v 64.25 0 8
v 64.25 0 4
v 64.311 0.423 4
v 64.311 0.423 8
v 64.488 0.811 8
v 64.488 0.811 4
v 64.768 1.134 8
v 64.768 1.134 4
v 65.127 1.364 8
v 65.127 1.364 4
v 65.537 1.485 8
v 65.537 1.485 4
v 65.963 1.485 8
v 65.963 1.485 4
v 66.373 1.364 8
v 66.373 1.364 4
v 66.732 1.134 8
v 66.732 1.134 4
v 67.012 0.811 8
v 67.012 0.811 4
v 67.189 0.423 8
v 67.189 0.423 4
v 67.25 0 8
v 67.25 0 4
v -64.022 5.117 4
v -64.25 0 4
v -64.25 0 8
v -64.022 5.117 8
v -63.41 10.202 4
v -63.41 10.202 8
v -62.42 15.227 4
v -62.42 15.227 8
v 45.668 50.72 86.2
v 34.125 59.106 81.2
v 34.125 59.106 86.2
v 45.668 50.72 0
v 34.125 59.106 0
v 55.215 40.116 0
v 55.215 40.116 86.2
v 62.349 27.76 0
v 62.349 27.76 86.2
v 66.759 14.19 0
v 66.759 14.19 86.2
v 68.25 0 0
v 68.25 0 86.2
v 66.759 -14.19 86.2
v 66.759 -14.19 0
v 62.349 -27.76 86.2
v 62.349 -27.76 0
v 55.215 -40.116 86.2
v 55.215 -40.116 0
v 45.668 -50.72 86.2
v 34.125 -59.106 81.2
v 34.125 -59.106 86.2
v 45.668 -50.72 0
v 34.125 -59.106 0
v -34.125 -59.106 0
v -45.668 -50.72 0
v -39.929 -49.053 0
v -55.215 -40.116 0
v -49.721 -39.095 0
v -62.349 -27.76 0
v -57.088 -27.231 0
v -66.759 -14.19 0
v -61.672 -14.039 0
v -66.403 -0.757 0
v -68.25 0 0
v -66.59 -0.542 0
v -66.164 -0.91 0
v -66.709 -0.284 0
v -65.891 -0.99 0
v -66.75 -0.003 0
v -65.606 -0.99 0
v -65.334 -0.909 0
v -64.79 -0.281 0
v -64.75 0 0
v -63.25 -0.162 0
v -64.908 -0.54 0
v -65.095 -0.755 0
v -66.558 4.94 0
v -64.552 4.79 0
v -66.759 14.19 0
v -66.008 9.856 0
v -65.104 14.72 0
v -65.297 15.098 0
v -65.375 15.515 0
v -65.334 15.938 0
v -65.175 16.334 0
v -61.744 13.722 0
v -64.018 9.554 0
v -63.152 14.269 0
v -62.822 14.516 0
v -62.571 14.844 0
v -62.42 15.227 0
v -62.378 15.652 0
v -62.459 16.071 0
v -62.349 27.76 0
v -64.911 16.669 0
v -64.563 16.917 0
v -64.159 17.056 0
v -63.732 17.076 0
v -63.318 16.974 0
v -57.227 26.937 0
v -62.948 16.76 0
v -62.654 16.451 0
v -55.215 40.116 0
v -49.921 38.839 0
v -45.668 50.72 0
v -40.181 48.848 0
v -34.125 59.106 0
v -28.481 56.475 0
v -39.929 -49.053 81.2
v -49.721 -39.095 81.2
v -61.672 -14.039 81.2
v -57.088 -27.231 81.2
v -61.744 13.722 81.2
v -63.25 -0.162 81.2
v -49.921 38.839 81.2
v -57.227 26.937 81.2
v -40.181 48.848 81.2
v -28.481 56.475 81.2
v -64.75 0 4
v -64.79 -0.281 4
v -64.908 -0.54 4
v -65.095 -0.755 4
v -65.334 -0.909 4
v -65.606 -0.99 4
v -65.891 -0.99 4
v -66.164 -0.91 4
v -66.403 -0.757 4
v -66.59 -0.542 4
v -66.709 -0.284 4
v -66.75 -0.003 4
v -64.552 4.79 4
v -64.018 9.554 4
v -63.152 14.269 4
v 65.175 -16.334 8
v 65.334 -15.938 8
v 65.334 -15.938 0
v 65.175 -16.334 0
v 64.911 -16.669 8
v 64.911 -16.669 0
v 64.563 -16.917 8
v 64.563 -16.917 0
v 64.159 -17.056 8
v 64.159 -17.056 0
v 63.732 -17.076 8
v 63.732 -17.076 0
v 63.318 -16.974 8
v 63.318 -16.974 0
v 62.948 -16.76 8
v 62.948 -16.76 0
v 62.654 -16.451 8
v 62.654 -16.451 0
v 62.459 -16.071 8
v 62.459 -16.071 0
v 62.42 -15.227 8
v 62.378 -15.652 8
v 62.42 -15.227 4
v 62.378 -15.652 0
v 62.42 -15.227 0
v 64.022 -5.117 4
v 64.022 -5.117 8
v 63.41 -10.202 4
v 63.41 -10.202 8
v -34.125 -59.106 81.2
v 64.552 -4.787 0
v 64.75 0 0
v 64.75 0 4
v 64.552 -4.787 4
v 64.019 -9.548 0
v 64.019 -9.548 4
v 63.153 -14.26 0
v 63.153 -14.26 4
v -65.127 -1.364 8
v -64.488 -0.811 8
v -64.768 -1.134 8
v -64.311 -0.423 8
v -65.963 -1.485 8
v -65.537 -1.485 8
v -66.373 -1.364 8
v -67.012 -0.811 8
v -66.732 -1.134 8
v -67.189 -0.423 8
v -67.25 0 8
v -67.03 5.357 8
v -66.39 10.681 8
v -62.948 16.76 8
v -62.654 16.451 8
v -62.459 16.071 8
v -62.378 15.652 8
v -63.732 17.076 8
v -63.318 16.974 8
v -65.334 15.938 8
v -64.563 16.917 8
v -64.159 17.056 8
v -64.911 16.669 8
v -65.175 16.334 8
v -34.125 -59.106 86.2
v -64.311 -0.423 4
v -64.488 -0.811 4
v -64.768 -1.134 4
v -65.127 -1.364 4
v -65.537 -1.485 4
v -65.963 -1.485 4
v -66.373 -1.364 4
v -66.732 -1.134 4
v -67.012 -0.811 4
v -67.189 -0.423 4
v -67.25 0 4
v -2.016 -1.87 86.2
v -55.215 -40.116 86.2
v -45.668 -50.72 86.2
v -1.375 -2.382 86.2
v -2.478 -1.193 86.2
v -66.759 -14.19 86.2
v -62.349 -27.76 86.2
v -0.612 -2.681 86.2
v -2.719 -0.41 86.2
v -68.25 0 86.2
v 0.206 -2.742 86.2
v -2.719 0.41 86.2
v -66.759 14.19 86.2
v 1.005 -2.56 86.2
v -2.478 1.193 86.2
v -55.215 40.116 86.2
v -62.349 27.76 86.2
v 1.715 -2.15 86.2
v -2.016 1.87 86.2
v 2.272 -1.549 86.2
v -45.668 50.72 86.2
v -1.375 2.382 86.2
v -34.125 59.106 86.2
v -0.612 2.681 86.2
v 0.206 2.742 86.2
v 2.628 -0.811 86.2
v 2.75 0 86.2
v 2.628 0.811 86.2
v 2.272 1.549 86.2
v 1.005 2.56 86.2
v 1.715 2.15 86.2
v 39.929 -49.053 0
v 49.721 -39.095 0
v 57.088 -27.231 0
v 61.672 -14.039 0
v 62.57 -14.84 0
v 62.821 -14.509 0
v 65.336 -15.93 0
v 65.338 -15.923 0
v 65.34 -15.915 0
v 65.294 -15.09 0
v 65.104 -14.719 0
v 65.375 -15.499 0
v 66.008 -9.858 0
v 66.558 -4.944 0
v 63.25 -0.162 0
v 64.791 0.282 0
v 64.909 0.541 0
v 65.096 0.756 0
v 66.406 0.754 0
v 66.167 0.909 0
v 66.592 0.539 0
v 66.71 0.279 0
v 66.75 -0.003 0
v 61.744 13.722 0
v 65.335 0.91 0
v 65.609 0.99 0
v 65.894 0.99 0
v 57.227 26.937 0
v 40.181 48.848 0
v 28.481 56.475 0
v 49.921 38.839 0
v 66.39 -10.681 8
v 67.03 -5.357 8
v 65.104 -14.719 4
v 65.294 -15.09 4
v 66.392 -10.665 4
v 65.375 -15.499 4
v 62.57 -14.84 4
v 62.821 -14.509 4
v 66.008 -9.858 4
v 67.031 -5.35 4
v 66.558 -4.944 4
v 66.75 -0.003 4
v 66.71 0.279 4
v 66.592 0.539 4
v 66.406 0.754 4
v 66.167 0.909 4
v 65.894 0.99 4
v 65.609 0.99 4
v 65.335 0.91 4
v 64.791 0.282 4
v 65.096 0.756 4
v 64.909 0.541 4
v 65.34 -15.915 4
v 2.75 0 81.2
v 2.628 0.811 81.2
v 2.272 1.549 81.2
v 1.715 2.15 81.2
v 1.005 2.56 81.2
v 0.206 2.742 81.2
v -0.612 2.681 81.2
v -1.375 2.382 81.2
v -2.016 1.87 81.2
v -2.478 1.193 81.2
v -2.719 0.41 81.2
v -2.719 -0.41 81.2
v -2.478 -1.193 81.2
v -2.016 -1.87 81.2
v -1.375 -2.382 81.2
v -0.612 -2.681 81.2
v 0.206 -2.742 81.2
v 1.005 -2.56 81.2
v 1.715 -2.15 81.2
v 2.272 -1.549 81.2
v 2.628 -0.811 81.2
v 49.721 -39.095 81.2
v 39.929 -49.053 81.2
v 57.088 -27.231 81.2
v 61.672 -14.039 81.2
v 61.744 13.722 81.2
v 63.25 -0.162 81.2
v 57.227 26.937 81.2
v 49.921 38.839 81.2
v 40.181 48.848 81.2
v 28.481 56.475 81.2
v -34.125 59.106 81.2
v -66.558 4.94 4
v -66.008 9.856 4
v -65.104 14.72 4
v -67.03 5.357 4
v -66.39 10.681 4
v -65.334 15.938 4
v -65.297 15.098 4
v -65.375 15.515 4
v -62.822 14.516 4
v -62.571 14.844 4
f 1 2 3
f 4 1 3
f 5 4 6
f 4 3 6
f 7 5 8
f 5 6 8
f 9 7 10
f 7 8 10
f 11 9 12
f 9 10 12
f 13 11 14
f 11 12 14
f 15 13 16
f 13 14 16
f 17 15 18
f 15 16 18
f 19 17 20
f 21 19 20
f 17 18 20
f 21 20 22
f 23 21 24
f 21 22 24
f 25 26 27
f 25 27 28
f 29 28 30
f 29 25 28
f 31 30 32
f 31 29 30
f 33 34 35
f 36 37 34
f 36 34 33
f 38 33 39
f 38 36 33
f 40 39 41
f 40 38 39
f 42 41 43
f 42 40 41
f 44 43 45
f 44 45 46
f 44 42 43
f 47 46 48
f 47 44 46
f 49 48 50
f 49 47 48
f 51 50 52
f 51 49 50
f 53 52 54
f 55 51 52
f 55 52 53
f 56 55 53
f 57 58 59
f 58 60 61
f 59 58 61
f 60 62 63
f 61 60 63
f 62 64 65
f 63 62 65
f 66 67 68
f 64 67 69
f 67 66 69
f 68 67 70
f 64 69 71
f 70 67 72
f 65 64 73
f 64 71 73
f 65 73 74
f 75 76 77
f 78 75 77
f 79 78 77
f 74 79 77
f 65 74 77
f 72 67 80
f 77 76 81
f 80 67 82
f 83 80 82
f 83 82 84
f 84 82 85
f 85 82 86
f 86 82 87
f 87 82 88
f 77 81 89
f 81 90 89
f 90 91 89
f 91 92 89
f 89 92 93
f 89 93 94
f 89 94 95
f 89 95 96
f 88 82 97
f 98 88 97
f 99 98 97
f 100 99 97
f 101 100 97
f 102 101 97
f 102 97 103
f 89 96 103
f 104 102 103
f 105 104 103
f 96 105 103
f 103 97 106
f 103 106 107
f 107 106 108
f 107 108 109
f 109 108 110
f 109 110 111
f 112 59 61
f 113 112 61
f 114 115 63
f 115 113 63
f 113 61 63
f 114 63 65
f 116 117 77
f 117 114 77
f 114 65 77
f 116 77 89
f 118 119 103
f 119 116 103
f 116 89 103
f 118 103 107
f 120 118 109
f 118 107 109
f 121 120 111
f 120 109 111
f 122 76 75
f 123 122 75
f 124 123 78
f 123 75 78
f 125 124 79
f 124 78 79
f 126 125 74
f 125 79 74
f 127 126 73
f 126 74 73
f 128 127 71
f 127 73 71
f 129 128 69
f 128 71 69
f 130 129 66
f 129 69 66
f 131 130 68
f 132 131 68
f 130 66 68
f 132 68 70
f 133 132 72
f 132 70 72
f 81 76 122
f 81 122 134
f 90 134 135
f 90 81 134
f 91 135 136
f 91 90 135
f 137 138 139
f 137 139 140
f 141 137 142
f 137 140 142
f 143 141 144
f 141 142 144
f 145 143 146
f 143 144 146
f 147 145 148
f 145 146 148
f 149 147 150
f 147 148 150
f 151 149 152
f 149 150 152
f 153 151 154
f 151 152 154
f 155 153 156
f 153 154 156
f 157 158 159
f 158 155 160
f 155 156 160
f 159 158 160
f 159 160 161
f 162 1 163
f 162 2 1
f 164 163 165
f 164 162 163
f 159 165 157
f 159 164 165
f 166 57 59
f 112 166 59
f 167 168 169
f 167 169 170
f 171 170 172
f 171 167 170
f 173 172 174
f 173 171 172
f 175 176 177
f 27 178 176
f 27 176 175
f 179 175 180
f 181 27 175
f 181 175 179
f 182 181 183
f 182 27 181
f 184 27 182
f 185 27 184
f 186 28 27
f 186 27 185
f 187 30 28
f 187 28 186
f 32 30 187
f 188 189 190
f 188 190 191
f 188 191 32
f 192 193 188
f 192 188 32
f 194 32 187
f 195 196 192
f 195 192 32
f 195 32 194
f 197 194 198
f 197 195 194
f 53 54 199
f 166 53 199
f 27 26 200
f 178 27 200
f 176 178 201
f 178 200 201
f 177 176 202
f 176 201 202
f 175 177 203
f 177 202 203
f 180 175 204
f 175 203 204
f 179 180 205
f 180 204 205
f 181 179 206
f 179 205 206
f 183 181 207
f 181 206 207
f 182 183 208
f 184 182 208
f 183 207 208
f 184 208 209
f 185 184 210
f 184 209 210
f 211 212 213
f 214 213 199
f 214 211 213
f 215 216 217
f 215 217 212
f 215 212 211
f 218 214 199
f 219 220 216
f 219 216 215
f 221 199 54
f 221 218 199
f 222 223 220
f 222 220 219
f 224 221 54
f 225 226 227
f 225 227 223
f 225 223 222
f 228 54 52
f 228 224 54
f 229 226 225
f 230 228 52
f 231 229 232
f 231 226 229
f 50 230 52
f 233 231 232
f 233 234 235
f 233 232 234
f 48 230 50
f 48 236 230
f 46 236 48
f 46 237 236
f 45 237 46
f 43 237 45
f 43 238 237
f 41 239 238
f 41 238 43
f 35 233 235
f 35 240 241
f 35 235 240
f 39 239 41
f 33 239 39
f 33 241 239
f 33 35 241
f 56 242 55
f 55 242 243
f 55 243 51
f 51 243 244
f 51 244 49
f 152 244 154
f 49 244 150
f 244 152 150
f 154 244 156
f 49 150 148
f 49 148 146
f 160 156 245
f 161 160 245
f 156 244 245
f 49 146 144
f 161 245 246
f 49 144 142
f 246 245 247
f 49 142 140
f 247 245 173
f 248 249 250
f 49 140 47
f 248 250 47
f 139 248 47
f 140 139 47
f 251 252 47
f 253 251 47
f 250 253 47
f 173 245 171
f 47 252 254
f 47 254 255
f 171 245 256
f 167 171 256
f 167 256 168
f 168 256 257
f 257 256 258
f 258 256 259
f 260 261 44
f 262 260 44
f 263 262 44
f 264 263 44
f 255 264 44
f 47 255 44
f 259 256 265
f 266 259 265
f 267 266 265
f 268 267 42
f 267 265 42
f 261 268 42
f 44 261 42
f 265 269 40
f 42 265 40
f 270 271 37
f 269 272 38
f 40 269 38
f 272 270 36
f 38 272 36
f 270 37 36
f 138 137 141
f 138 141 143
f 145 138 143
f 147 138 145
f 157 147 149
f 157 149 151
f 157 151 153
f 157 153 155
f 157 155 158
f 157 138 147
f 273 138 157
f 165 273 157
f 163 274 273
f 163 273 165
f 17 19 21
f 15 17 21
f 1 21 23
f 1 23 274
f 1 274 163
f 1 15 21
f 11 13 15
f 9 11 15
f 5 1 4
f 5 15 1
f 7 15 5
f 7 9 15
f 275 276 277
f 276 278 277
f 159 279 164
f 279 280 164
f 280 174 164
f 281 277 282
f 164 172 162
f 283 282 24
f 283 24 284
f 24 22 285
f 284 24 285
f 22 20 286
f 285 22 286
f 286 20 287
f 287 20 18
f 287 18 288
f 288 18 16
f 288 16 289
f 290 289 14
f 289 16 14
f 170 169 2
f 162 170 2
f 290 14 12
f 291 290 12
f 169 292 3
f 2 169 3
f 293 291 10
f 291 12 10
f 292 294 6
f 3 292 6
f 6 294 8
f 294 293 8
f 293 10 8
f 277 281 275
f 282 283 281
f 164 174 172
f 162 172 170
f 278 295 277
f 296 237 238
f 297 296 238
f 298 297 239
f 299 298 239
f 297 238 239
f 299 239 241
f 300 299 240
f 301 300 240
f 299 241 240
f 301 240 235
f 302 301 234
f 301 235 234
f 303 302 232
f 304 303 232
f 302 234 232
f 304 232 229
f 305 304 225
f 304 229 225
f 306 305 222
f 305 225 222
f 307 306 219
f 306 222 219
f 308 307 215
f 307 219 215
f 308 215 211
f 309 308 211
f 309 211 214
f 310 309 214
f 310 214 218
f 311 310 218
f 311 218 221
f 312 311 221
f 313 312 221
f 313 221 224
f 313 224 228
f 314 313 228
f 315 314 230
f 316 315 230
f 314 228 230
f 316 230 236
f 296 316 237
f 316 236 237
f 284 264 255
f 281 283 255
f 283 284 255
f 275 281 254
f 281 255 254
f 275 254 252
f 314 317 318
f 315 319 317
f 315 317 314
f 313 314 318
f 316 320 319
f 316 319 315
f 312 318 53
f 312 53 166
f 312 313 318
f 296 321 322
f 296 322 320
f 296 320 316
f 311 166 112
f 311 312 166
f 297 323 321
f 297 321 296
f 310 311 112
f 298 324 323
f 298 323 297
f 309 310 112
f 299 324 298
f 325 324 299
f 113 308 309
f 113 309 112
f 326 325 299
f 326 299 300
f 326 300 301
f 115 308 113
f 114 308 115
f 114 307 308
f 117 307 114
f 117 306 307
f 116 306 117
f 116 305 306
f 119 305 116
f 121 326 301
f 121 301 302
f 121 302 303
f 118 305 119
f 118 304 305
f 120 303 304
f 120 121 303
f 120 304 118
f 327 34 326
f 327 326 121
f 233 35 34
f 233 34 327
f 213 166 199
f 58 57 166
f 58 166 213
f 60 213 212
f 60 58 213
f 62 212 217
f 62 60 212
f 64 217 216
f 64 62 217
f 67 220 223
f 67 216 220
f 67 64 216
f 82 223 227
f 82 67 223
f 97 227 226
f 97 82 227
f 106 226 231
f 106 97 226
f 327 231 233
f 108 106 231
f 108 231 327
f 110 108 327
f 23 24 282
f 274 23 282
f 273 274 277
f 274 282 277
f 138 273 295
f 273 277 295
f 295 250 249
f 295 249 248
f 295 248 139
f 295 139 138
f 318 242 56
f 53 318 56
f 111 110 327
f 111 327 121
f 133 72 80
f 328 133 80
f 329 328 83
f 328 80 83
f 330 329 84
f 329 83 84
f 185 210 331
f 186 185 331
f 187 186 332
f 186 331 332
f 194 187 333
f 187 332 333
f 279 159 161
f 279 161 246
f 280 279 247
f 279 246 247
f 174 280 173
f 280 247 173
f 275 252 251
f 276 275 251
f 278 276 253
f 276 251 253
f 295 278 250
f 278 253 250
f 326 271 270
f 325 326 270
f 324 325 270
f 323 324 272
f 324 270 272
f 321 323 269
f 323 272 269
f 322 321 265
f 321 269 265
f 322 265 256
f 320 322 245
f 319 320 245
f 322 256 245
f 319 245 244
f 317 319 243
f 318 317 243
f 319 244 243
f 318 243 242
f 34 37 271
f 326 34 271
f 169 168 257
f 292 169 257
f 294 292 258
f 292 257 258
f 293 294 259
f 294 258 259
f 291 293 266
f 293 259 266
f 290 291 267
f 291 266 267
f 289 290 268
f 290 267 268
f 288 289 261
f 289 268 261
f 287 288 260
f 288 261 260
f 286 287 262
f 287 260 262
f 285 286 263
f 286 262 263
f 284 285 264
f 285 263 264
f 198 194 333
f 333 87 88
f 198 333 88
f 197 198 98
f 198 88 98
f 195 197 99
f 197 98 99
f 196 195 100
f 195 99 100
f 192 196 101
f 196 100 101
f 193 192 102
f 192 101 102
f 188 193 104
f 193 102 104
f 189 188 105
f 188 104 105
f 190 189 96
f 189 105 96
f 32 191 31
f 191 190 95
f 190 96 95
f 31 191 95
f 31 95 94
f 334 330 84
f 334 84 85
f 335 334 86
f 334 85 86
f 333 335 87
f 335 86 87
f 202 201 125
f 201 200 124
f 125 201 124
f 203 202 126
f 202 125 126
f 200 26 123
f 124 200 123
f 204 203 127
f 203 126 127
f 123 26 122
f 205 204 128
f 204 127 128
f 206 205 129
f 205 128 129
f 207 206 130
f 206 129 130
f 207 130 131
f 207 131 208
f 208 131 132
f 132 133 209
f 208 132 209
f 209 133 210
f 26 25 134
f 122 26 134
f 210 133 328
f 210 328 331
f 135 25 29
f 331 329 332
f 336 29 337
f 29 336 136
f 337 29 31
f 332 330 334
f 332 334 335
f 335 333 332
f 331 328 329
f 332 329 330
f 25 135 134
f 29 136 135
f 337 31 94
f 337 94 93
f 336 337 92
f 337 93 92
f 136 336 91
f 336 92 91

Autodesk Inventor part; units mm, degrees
ref_plane "YZ Plane" through (0, 0, 0) normal (1, 0, 0) x (0, 1, 0)
ref_plane "XZ Plane" through (0, 0, 0) normal (0, 1, 0) x (-1, 0, 0)
ref_plane "XY Plane" through (0, 0, 0) normal (0, 0, 1) x (1, 0, 0)
sketch "Sketch1" plane through (0, 0, 0) normal (0, 0, 1) x (1, 0, 0)
  circle A0 centre (0, 0) radius 63.25
  circle A1 centre (0, 0) radius 68.25
  dimension "d0" = 126.5
  dimension "d1" = 5
extrude "Extrusion1" add sketch "Sketch1" along normal blind 81.2
sketch "Sketch2" plane through (0, 0, 81.2) normal (0, 0, 1) x (1, 0, 0)
  circle A0 centre (0, 0) radius 68.25
extrude "Extrusion2" add sketch "Sketch2" along normal blind 5
sketch "Sketch3" plane through (0, 0, 86.2) normal (0, 0, 1) x (1, 0, 0)
  circle A0 centre (0, 0) radius 2.75
  dimension "d6" = 5.5
extrude "Extrusion3" cut sketch "Sketch3" against normal blind 5
sketch "Sketch4" plane through (0, 0, 86.2) normal (0, 0, 1) x (1, 0, 0)
  line L0 (0, 0) -> (-34.125, 59.1062)
  circle A0 centre (0, 0) radius 68.25 projected
  line L1 (0, 0) -> (68.25, 0) construction
  circle A1 centre (0, 0) radius 2.75 projected
  line L2 (0, 0) -> (34.125, 59.1062)
  line L3 (34.125, 59.1062) -> (-34.125, 59.1062)
  line L4 (0, 0) -> (-34.125, -59.1062)
  circle A2 centre (0, 0) radius 68.25 projected
  line L5 (0, 0) -> (68.25, 0) construction
  line L6 (0, 0) -> (34.125, -59.1062)
  line L7 (0, 0) -> (68.25, 0) construction
  line L8 (34.125, -59.1062) -> (-34.125, -59.1062)
  dimension "d9" = 120
  dimension "d15" = 120
  dimension "d16" = 60
extrude "Extrusion4" cut sketch "Sketch4" against normal through all contours A0 L3 | L8 A0
sketch "Sketch5" plane through (0, 0, 0) normal (0, 0, -1) x (-1, 0, 0)
  line L0 (-34.125, 59.1062) -> (34.125, 59.1062) projected
  line L1 (34.125, 59.1062) -> (28.4813, 56.4746)
  arc A0 (-22.517, 59.1062) -> (22.517, 59.1062) centre (0, 0) ccw projected
  line L2 (34.125, 59.1062) -> (40.3521, 59.1062) construction
  line L3 (0, 0) -> (0, 13.3987)
  line L4 (-34.125, 59.1062) -> (-28.4813, 56.4746)
  arc A1 (-22.517, 59.1062) -> (-28.4813, 56.4746) centre (0, 0) ccw
  line L5 (-34.125, 59.1062) -> (-22.517, 59.1062)
  dimension "d12" = 155
extrude "Extrusion5" cut sketch "Sketch5" against normal blind 81.2 contours L0 A0 L4 | L0 L1 A0
sketch "Sketch6" plane through (-34.125, 59.1062, 86.2) normal (0, 1, 0) x (1, 0, 0)
  point P0 (34.125, 86.2)
sketch "Sketch7" plane through (0, 0, 0) normal (0, 0, -1) x (-1, 0, 0)
  arc A0 (34.125, -59.1062) -> (34.125, 59.1062) centre (0, 0) ccw projected
  line L0 (34.125, 59.1062) -> (28.4813, 56.4746) projected
  arc A1 (22.517, -59.1062) -> (28.4813, 56.4746) centre (0, 0) ccw projected
  line L1 (22.517, -59.1062) -> (34.125, -59.1062) projected
  arc A2 (34.125, -59.1062) -> (34.125, 59.1062) centre (0, 0) ccw projected
  line L2 (-28.4813, 56.4746) -> (-34.125, 59.1062) projected
  arc A3 (-34.125, 59.1062) -> (-34.125, -59.1062) centre (0, 0) ccw projected
  line L3 (-34.125, -59.1062) -> (-22.517, -59.1062) projected
  arc A4 (-28.4813, 56.4746) -> (-22.517, -59.1062) centre (0, 0) ccw projected
  line L4 (22.517, -59.1062) -> (34.125, -59.1062) projected
  line L5 (34.125, -59.1062) -> (39.929, -49.0534)
  arc A5 (22.517, -59.1062) -> (28.4813, 56.4746) centre (0, 0) ccw projected
  line L6 (34.125, -59.1062) -> (45.733, -59.1062) construction
  circle A6 centre (0, 0) radius 2.75 projected
  line L7 (0, 0) -> (0, -7.8217)
  line L8 (-34.125, -59.1062) -> (-39.929, -49.0534)
  line L9 (34.125, -59.1062) -> (22.517, -59.1062)
  arc A7 (22.517, -59.1062) -> (39.929, -49.0534) centre (0, 0) ccw
  line L10 (34.125, -59.1062) -> (39.929, -49.0534)
  dimension "d17" = 60
extrude "Extrusion6" cut sketch "Sketch7" against normal blind 81.2 contours L1 A1 L5
mirror "Mirror1" about plane through (0, 0, 0) normal (1, 0, 0) of "Extrusion6"
sketch "Sketch8" plane through (0, 0, 0) normal (0, 0, -1) x (-1, 0, 0)
  arc A0 (39.929, -49.0534) -> (28.4813, 56.4746) centre (0, 0) ccw projected
  line L0 (63.25, 0) -> (68.25, 0)
  arc A1 (34.125, -59.1062) -> (34.125, 59.1062) centre (0, 0) ccw projected
  arc A2 (64.25, 0) -> (67.25, 0) centre (65.75, 0) ccw
  line L1 (61.4481, 14.99) -> (66.3056, 16.1749)
  arc A3 (65.3341, 15.9379) -> (62.4196, 15.227) centre (63.8768, 15.5825) ccw
  arc A4 (67.25, 0) -> (65.3341, 15.9379) centre (-0.9999, -0.1202) ccw
  arc A5 (64.25, 0) -> (62.4196, 15.227) centre (-3.9983, -0.4806) ccw
  line L2 (0, 0) -> (0, 7.6651)
  line L3 (0, 0) -> (-11.2866, 0)
  arc A6 (-64.25, 0) -> (-62.4196, -15.227) centre (3.9983, 0.4806) ccw
  arc A7 (-65.3341, -15.9379) -> (-62.4196, -15.227) centre (-63.8768, -15.5825) ccw
  arc A8 (-67.25, 0) -> (-65.3341, -15.9379) centre (0.9999, 0.1202) ccw
  arc A9 (-64.25, 0) -> (-67.25, 0) centre (-65.75, 0) ccw
  dimension "d20" = 3
  dimension "d21" = 5
  dimension "d22" = 3
  dimension "d23" = 68.25
  dimension "d24" = 68.25
extrude "Extrusion7" cut sketch "Sketch8" against normal blind 8 contours A5 L1 A4 L0 | L0 A2 | A3 L1 | A6 A7 A8 A9
sketch "Sketch9" plane through (0, 0, 0) normal (0, 0, -1) x (-1, 0, 0)
  arc A0 (64.25, 0) -> (67.25, 0) centre (65.75, 0) ccw projected
  arc A1 (64.75, 0) -> (66.75, -0.0027) centre (65.75, 0) ccw
  arc A2 (64.8496, 15.8142) -> (64.8483, 15.8195) centre (63.8768, 15.5825) ccw
  arc A3 (64.75, 0) -> (63.1516, 14.2694) centre (-3.4987, -0.4206) ccw
  line L0 (0, 0) -> (0, 7.6651) projected
  circle A4 centre (0, 0) radius 2.75 projected
  line L1 (34.125, -59.1062) -> (-34.125, -59.1062) projected
  line L2 (39.929, -49.0534) -> (34.125, -59.1062) projected
  arc A5 (39.929, -49.0534) -> (28.4813, 56.4746) centre (0, 0) ccw projected
  line L3 (34.125, 59.1062) -> (28.4813, 56.4746) projected
  line L4 (-34.125, 59.1062) -> (34.125, 59.1062) projected
  line L5 (-28.4813, 56.4746) -> (-34.125, 59.1062) projected
  arc A6 (-28.4813, 56.4746) -> (-39.929, -49.0534) centre (0, 0) ccw projected
  line L6 (-39.929, -49.0534) -> (-34.125, -59.1062) projected
  line L7 (0, 0) -> (-11.2866, 0) projected
  arc A7 (64.25, 0) -> (62.4196, 15.227) centre (-3.9983, -0.4806) ccw projected
  arc A8 (67.25, 0) -> (65.3341, 15.9379) centre (-0.9999, -0.1202) ccw projected
  arc A9 (64.25, 0) -> (67.25, 0) centre (65.75, 0) ccw projected
  arc A10 (-64.75, 0) -> (-66.75, -0.0027) centre (-65.75, 0) ccw
  arc A11 (-65.1039, -14.7194) -> (-65.3397, -15.9149) centre (-63.877, -15.5823) ccw
  arc A12 (-64.849, -15.8165) -> (-64.849, -15.8165) centre (-63.8765, -15.5834) ccw
  arc A13 (-64.25, 0) -> (-62.4196, -15.227) centre (3.9983, 0.4806) ccw
  arc A14 (-64.75, 0) -> (-63.1534, -14.2595) centre (3.4986, 0.4224) ccw
  arc A15 (-66.75, -0.0027) -> (-65.1039, -14.7194) centre (1.4998, 0.1807) ccw
  arc A16 (-67.25, 0) -> (-65.3341, -15.9379) centre (0.9999, 0.1202) ccw
  arc A17 (-64.25, 0) -> (-67.25, 0) centre (-65.75, 0) ccw
  arc A18 (-64.75, 0) -> (-66.75, -0.0027) centre (-65.75, 0) ccw
  arc A19 (66.75, -0.0027) -> (65.1039, 14.7197) centre (-1.4998, -0.1803) ccw
  arc A20 (64.8496, 15.8142) -> (64.8483, 15.8195) centre (-1.4998, -0.1803) ccw
  arc A21 (-67.25, 0) -> (-66.7377, -1.1289) centre (-65.75, 0) ccw
  arc A22 (-64.7342, -1.1037) -> (-64.25, 0) centre (-65.75, 0) ccw
  arc A23 (65.1039, 14.7197) -> (65.3341, 15.9379) centre (63.8768, 15.5825) ccw
  arc A24 (62.4196, 15.227) -> (63.1516, 14.2694) centre (63.8768, 15.5825) ccw
  arc A25 (-65.3341, -15.9379) -> (-65.3341, -15.9379) centre (-63.877, -15.5823) ccw
  arc A26 (-62.4196, -15.227) -> (-63.1534, -14.2595) centre (-63.8795, -15.5722) ccw
  point P0 (65.3341, 15.9379)
  dimension "d28" = 2
  dimension "d30" = 68.25
extrude "Extrusion8" add sketch "Sketch9" against normal blind 4 contours A7 A24 A3 A1 A19 A23 A8 A0 | A21 A15 A11 A16 | A10 A15 A21 A17 A22 A14 | A22 A13 A26 A14
sketch "Sketch10" plane through (0, 0, 81.2) normal (0, 0, -1) x (-1, 0, 0)
  point P0 (0, 0)
sketch "Sketch11" plane through (0, 0, 81.2) normal (0, 0, -1) x (-1, 0, 0)
  arc A0 (-65.3397, -15.9149) -> (-65.3341, -15.9379) centre (0.9999, 0.1202) ccw projected
  arc A1 (-65.1039, -14.7194) -> (-65.3397, -15.9149) centre (-63.877, -15.5823) ccw projected
  arc A2 (-66.75, -0.0027) -> (-65.1039, -14.7194) centre (1.4998, 0.1807) ccw projected
  arc A3 (-64.75, 0) -> (-66.75, -0.0027) centre (-65.75, 0) ccw projected
  arc A4 (-64.75, 0) -> (-63.1534, -14.2595) centre (3.4986, 0.4224) ccw projected
  arc A5 (-62.4196, -15.227) -> (-63.1534, -14.2595) centre (-63.8795, -15.5722) ccw projected
  arc A6 (-65.3341, -15.9379) -> (-62.4196, -15.227) centre (-63.8768, -15.5825) ccw projected
  line L0 (-34.125, -59.1062) -> (-39.929, -49.0534) projected
  arc A7 (-28.4813, 56.4746) -> (-39.929, -49.0534) centre (0, 0) ccw projected
  line L1 (-28.4813, 56.4746) -> (-34.125, 59.1062) projected
  arc A8 (-34.125, 59.1062) -> (-34.125, -59.1062) centre (0, 0) ccw projected
  arc A9 (65.1039, 14.7197) -> (63.1516, 14.2694) centre (63.8768, 15.5825) ccw projected
  arc A10 (66.75, -0.0027) -> (65.1039, 14.7197) centre (-1.4998, -0.1803) ccw projected
  arc A11 (64.75, 0) -> (66.75, -0.0027) centre (65.75, 0) ccw projected
  arc A12 (64.75, 0) -> (63.1516, 14.2694) centre (-3.4987, -0.4206) ccw projected
  line L2 (39.929, -49.0534) -> (34.125, -59.1062) projected
  arc A13 (34.125, -59.1062) -> (34.125, 59.1062) centre (0, 0) ccw projected
  line L3 (34.125, 59.1062) -> (28.4813, 56.4746) projected
  arc A14 (39.929, -49.0534) -> (28.4813, 56.4746) centre (0, 0) ccw projected
  circle A15 centre (0, 0) radius 2.75 projected
  line L4 (0, 0) -> (65.75, 0)
  line L5 (0, 0) -> (63.8768, 15.5825)
properties part number "Gear Container V2"
